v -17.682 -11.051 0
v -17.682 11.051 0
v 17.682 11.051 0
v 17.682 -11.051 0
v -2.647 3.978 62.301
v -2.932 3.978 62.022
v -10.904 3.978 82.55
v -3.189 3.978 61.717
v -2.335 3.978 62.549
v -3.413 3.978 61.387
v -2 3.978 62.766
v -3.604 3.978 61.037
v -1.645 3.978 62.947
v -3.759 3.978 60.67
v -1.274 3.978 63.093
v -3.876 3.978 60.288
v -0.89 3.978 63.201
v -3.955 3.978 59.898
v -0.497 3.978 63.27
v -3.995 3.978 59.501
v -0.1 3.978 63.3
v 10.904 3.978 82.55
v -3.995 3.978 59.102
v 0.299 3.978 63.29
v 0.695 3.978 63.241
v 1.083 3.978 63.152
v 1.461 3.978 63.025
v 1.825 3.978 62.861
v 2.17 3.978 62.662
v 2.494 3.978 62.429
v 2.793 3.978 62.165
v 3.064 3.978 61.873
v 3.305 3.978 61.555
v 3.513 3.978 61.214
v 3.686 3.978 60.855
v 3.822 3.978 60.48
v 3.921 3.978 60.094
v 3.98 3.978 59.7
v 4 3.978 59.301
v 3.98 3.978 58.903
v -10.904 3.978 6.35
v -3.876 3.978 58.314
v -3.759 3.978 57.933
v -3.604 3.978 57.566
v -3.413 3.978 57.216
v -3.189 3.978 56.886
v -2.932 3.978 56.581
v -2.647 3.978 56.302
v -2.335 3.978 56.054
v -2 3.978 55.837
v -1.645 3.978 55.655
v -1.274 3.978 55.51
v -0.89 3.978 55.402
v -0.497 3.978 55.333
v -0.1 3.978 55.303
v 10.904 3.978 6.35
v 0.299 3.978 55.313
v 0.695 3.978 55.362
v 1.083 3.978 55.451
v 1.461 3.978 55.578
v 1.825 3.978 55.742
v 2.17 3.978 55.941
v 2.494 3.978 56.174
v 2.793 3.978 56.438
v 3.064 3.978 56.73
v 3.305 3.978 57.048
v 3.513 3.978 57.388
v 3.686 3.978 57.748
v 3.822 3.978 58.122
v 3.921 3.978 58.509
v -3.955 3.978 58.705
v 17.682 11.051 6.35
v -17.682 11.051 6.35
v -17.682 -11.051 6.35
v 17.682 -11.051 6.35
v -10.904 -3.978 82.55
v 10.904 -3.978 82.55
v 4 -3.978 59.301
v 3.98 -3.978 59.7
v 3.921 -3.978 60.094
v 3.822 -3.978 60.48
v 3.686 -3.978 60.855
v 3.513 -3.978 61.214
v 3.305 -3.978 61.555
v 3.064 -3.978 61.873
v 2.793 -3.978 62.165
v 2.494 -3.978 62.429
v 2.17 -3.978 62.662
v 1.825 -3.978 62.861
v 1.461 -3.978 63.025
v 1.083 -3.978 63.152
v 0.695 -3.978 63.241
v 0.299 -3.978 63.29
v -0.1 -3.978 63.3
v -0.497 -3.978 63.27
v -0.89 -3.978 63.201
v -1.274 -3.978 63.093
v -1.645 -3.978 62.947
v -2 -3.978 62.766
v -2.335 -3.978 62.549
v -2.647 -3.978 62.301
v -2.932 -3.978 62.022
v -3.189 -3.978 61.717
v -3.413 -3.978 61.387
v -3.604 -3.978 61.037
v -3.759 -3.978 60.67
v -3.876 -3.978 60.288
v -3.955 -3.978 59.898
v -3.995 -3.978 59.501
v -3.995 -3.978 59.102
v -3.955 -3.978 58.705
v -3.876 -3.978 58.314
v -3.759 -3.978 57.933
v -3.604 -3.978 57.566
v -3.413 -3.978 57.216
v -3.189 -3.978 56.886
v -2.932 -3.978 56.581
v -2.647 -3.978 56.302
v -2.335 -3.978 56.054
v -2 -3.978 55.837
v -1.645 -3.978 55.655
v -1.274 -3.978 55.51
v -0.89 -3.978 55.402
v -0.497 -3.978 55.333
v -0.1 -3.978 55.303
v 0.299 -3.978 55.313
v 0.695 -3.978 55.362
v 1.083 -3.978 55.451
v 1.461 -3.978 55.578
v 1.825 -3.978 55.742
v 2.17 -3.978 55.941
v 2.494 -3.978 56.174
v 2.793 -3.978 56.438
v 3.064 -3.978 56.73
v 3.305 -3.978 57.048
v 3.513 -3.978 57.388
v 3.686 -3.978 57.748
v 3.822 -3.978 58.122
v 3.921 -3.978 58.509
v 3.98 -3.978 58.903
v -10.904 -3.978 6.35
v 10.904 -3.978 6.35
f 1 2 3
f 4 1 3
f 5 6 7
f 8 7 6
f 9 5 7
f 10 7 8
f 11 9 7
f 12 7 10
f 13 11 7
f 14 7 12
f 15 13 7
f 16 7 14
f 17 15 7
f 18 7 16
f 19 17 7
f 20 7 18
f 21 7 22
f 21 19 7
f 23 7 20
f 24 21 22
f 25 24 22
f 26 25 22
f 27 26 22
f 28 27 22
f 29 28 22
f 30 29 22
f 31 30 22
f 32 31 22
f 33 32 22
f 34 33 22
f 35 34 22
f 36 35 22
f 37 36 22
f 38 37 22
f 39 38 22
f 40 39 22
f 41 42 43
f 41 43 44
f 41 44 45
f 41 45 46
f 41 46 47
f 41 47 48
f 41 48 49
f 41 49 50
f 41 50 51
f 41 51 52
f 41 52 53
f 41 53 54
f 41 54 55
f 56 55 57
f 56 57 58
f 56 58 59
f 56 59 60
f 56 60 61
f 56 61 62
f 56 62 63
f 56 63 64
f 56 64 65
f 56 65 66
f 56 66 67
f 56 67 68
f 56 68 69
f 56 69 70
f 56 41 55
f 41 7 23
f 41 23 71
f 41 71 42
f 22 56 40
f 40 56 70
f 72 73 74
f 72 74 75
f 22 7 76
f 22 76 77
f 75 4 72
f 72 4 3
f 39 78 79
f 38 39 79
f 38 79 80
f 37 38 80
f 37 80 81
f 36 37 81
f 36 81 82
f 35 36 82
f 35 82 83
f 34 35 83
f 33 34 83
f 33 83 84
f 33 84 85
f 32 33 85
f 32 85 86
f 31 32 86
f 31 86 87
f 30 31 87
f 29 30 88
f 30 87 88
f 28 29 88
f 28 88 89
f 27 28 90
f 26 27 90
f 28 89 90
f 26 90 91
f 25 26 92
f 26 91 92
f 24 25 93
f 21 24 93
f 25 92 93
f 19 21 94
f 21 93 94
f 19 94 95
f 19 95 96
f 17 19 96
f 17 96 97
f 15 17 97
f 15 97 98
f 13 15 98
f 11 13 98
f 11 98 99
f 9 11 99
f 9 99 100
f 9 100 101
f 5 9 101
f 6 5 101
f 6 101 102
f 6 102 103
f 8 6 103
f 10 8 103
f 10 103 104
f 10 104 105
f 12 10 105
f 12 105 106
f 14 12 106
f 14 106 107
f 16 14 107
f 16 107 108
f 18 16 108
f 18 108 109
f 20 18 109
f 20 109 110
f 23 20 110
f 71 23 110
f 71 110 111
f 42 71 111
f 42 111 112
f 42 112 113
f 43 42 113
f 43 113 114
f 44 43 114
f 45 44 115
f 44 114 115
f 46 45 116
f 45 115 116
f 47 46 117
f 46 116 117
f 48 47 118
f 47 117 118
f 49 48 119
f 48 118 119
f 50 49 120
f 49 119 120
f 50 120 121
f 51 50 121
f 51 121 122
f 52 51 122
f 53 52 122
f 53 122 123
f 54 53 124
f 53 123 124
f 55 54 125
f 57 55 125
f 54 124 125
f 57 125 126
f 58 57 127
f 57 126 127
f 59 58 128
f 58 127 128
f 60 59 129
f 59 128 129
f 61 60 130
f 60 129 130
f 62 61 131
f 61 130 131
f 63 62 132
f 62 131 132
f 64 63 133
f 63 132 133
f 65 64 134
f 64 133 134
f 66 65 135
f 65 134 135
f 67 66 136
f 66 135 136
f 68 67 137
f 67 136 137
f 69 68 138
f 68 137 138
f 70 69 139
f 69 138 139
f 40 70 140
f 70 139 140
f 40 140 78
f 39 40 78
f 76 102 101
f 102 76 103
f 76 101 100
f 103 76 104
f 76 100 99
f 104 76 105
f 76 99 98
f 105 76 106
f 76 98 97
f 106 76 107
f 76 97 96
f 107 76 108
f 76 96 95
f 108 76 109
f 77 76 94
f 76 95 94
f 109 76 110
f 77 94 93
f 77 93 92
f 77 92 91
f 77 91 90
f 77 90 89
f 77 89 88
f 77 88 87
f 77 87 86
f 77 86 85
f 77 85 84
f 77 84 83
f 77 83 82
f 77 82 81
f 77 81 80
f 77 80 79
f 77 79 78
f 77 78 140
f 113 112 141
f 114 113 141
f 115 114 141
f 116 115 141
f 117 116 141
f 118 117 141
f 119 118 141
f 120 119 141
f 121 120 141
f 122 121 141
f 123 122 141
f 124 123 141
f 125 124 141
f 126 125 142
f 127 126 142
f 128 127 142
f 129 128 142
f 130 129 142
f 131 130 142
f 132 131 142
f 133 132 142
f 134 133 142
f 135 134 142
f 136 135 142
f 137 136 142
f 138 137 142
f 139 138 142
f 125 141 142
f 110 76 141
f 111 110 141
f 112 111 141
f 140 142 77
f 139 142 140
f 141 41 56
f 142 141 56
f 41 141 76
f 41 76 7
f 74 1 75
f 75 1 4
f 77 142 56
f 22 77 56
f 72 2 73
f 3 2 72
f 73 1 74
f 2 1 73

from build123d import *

# Parameters (mm, degrees)
F0_W     = 35.363536
F0_H     = 22.10221
F1_DEPTH = 6.35
F2_W     = 21.807512
F2_H     = 7.956796
F3_DEPTH = 76.2
F4_R     = 4
F5_DEPTH = 15.030503


with BuildPart() as f1:
    # F0 (on Top) → F1 (new body)
    with BuildSketch(Plane.XY):
        Rectangle(F0_W, F0_H)
    extrude(amount=F1_DEPTH)


with BuildPart() as f3:
    # F2 (on face) → F3 (new body)
    with BuildSketch(Plane.XY.offset(6.35)):
        Rectangle(F2_W, F2_H)
    extrude(amount=F3_DEPTH)

    # F4 (on face) → F5 (cut, through all)
    with BuildSketch(Plane.XZ.offset(3.978398)):
        with Locations((0, 59.301462)):
            Circle(F4_R)
    extrude(amount=-F5_DEPTH, mode=Mode.SUBTRACT)


solid = Compound([f1.part, f3.part])
